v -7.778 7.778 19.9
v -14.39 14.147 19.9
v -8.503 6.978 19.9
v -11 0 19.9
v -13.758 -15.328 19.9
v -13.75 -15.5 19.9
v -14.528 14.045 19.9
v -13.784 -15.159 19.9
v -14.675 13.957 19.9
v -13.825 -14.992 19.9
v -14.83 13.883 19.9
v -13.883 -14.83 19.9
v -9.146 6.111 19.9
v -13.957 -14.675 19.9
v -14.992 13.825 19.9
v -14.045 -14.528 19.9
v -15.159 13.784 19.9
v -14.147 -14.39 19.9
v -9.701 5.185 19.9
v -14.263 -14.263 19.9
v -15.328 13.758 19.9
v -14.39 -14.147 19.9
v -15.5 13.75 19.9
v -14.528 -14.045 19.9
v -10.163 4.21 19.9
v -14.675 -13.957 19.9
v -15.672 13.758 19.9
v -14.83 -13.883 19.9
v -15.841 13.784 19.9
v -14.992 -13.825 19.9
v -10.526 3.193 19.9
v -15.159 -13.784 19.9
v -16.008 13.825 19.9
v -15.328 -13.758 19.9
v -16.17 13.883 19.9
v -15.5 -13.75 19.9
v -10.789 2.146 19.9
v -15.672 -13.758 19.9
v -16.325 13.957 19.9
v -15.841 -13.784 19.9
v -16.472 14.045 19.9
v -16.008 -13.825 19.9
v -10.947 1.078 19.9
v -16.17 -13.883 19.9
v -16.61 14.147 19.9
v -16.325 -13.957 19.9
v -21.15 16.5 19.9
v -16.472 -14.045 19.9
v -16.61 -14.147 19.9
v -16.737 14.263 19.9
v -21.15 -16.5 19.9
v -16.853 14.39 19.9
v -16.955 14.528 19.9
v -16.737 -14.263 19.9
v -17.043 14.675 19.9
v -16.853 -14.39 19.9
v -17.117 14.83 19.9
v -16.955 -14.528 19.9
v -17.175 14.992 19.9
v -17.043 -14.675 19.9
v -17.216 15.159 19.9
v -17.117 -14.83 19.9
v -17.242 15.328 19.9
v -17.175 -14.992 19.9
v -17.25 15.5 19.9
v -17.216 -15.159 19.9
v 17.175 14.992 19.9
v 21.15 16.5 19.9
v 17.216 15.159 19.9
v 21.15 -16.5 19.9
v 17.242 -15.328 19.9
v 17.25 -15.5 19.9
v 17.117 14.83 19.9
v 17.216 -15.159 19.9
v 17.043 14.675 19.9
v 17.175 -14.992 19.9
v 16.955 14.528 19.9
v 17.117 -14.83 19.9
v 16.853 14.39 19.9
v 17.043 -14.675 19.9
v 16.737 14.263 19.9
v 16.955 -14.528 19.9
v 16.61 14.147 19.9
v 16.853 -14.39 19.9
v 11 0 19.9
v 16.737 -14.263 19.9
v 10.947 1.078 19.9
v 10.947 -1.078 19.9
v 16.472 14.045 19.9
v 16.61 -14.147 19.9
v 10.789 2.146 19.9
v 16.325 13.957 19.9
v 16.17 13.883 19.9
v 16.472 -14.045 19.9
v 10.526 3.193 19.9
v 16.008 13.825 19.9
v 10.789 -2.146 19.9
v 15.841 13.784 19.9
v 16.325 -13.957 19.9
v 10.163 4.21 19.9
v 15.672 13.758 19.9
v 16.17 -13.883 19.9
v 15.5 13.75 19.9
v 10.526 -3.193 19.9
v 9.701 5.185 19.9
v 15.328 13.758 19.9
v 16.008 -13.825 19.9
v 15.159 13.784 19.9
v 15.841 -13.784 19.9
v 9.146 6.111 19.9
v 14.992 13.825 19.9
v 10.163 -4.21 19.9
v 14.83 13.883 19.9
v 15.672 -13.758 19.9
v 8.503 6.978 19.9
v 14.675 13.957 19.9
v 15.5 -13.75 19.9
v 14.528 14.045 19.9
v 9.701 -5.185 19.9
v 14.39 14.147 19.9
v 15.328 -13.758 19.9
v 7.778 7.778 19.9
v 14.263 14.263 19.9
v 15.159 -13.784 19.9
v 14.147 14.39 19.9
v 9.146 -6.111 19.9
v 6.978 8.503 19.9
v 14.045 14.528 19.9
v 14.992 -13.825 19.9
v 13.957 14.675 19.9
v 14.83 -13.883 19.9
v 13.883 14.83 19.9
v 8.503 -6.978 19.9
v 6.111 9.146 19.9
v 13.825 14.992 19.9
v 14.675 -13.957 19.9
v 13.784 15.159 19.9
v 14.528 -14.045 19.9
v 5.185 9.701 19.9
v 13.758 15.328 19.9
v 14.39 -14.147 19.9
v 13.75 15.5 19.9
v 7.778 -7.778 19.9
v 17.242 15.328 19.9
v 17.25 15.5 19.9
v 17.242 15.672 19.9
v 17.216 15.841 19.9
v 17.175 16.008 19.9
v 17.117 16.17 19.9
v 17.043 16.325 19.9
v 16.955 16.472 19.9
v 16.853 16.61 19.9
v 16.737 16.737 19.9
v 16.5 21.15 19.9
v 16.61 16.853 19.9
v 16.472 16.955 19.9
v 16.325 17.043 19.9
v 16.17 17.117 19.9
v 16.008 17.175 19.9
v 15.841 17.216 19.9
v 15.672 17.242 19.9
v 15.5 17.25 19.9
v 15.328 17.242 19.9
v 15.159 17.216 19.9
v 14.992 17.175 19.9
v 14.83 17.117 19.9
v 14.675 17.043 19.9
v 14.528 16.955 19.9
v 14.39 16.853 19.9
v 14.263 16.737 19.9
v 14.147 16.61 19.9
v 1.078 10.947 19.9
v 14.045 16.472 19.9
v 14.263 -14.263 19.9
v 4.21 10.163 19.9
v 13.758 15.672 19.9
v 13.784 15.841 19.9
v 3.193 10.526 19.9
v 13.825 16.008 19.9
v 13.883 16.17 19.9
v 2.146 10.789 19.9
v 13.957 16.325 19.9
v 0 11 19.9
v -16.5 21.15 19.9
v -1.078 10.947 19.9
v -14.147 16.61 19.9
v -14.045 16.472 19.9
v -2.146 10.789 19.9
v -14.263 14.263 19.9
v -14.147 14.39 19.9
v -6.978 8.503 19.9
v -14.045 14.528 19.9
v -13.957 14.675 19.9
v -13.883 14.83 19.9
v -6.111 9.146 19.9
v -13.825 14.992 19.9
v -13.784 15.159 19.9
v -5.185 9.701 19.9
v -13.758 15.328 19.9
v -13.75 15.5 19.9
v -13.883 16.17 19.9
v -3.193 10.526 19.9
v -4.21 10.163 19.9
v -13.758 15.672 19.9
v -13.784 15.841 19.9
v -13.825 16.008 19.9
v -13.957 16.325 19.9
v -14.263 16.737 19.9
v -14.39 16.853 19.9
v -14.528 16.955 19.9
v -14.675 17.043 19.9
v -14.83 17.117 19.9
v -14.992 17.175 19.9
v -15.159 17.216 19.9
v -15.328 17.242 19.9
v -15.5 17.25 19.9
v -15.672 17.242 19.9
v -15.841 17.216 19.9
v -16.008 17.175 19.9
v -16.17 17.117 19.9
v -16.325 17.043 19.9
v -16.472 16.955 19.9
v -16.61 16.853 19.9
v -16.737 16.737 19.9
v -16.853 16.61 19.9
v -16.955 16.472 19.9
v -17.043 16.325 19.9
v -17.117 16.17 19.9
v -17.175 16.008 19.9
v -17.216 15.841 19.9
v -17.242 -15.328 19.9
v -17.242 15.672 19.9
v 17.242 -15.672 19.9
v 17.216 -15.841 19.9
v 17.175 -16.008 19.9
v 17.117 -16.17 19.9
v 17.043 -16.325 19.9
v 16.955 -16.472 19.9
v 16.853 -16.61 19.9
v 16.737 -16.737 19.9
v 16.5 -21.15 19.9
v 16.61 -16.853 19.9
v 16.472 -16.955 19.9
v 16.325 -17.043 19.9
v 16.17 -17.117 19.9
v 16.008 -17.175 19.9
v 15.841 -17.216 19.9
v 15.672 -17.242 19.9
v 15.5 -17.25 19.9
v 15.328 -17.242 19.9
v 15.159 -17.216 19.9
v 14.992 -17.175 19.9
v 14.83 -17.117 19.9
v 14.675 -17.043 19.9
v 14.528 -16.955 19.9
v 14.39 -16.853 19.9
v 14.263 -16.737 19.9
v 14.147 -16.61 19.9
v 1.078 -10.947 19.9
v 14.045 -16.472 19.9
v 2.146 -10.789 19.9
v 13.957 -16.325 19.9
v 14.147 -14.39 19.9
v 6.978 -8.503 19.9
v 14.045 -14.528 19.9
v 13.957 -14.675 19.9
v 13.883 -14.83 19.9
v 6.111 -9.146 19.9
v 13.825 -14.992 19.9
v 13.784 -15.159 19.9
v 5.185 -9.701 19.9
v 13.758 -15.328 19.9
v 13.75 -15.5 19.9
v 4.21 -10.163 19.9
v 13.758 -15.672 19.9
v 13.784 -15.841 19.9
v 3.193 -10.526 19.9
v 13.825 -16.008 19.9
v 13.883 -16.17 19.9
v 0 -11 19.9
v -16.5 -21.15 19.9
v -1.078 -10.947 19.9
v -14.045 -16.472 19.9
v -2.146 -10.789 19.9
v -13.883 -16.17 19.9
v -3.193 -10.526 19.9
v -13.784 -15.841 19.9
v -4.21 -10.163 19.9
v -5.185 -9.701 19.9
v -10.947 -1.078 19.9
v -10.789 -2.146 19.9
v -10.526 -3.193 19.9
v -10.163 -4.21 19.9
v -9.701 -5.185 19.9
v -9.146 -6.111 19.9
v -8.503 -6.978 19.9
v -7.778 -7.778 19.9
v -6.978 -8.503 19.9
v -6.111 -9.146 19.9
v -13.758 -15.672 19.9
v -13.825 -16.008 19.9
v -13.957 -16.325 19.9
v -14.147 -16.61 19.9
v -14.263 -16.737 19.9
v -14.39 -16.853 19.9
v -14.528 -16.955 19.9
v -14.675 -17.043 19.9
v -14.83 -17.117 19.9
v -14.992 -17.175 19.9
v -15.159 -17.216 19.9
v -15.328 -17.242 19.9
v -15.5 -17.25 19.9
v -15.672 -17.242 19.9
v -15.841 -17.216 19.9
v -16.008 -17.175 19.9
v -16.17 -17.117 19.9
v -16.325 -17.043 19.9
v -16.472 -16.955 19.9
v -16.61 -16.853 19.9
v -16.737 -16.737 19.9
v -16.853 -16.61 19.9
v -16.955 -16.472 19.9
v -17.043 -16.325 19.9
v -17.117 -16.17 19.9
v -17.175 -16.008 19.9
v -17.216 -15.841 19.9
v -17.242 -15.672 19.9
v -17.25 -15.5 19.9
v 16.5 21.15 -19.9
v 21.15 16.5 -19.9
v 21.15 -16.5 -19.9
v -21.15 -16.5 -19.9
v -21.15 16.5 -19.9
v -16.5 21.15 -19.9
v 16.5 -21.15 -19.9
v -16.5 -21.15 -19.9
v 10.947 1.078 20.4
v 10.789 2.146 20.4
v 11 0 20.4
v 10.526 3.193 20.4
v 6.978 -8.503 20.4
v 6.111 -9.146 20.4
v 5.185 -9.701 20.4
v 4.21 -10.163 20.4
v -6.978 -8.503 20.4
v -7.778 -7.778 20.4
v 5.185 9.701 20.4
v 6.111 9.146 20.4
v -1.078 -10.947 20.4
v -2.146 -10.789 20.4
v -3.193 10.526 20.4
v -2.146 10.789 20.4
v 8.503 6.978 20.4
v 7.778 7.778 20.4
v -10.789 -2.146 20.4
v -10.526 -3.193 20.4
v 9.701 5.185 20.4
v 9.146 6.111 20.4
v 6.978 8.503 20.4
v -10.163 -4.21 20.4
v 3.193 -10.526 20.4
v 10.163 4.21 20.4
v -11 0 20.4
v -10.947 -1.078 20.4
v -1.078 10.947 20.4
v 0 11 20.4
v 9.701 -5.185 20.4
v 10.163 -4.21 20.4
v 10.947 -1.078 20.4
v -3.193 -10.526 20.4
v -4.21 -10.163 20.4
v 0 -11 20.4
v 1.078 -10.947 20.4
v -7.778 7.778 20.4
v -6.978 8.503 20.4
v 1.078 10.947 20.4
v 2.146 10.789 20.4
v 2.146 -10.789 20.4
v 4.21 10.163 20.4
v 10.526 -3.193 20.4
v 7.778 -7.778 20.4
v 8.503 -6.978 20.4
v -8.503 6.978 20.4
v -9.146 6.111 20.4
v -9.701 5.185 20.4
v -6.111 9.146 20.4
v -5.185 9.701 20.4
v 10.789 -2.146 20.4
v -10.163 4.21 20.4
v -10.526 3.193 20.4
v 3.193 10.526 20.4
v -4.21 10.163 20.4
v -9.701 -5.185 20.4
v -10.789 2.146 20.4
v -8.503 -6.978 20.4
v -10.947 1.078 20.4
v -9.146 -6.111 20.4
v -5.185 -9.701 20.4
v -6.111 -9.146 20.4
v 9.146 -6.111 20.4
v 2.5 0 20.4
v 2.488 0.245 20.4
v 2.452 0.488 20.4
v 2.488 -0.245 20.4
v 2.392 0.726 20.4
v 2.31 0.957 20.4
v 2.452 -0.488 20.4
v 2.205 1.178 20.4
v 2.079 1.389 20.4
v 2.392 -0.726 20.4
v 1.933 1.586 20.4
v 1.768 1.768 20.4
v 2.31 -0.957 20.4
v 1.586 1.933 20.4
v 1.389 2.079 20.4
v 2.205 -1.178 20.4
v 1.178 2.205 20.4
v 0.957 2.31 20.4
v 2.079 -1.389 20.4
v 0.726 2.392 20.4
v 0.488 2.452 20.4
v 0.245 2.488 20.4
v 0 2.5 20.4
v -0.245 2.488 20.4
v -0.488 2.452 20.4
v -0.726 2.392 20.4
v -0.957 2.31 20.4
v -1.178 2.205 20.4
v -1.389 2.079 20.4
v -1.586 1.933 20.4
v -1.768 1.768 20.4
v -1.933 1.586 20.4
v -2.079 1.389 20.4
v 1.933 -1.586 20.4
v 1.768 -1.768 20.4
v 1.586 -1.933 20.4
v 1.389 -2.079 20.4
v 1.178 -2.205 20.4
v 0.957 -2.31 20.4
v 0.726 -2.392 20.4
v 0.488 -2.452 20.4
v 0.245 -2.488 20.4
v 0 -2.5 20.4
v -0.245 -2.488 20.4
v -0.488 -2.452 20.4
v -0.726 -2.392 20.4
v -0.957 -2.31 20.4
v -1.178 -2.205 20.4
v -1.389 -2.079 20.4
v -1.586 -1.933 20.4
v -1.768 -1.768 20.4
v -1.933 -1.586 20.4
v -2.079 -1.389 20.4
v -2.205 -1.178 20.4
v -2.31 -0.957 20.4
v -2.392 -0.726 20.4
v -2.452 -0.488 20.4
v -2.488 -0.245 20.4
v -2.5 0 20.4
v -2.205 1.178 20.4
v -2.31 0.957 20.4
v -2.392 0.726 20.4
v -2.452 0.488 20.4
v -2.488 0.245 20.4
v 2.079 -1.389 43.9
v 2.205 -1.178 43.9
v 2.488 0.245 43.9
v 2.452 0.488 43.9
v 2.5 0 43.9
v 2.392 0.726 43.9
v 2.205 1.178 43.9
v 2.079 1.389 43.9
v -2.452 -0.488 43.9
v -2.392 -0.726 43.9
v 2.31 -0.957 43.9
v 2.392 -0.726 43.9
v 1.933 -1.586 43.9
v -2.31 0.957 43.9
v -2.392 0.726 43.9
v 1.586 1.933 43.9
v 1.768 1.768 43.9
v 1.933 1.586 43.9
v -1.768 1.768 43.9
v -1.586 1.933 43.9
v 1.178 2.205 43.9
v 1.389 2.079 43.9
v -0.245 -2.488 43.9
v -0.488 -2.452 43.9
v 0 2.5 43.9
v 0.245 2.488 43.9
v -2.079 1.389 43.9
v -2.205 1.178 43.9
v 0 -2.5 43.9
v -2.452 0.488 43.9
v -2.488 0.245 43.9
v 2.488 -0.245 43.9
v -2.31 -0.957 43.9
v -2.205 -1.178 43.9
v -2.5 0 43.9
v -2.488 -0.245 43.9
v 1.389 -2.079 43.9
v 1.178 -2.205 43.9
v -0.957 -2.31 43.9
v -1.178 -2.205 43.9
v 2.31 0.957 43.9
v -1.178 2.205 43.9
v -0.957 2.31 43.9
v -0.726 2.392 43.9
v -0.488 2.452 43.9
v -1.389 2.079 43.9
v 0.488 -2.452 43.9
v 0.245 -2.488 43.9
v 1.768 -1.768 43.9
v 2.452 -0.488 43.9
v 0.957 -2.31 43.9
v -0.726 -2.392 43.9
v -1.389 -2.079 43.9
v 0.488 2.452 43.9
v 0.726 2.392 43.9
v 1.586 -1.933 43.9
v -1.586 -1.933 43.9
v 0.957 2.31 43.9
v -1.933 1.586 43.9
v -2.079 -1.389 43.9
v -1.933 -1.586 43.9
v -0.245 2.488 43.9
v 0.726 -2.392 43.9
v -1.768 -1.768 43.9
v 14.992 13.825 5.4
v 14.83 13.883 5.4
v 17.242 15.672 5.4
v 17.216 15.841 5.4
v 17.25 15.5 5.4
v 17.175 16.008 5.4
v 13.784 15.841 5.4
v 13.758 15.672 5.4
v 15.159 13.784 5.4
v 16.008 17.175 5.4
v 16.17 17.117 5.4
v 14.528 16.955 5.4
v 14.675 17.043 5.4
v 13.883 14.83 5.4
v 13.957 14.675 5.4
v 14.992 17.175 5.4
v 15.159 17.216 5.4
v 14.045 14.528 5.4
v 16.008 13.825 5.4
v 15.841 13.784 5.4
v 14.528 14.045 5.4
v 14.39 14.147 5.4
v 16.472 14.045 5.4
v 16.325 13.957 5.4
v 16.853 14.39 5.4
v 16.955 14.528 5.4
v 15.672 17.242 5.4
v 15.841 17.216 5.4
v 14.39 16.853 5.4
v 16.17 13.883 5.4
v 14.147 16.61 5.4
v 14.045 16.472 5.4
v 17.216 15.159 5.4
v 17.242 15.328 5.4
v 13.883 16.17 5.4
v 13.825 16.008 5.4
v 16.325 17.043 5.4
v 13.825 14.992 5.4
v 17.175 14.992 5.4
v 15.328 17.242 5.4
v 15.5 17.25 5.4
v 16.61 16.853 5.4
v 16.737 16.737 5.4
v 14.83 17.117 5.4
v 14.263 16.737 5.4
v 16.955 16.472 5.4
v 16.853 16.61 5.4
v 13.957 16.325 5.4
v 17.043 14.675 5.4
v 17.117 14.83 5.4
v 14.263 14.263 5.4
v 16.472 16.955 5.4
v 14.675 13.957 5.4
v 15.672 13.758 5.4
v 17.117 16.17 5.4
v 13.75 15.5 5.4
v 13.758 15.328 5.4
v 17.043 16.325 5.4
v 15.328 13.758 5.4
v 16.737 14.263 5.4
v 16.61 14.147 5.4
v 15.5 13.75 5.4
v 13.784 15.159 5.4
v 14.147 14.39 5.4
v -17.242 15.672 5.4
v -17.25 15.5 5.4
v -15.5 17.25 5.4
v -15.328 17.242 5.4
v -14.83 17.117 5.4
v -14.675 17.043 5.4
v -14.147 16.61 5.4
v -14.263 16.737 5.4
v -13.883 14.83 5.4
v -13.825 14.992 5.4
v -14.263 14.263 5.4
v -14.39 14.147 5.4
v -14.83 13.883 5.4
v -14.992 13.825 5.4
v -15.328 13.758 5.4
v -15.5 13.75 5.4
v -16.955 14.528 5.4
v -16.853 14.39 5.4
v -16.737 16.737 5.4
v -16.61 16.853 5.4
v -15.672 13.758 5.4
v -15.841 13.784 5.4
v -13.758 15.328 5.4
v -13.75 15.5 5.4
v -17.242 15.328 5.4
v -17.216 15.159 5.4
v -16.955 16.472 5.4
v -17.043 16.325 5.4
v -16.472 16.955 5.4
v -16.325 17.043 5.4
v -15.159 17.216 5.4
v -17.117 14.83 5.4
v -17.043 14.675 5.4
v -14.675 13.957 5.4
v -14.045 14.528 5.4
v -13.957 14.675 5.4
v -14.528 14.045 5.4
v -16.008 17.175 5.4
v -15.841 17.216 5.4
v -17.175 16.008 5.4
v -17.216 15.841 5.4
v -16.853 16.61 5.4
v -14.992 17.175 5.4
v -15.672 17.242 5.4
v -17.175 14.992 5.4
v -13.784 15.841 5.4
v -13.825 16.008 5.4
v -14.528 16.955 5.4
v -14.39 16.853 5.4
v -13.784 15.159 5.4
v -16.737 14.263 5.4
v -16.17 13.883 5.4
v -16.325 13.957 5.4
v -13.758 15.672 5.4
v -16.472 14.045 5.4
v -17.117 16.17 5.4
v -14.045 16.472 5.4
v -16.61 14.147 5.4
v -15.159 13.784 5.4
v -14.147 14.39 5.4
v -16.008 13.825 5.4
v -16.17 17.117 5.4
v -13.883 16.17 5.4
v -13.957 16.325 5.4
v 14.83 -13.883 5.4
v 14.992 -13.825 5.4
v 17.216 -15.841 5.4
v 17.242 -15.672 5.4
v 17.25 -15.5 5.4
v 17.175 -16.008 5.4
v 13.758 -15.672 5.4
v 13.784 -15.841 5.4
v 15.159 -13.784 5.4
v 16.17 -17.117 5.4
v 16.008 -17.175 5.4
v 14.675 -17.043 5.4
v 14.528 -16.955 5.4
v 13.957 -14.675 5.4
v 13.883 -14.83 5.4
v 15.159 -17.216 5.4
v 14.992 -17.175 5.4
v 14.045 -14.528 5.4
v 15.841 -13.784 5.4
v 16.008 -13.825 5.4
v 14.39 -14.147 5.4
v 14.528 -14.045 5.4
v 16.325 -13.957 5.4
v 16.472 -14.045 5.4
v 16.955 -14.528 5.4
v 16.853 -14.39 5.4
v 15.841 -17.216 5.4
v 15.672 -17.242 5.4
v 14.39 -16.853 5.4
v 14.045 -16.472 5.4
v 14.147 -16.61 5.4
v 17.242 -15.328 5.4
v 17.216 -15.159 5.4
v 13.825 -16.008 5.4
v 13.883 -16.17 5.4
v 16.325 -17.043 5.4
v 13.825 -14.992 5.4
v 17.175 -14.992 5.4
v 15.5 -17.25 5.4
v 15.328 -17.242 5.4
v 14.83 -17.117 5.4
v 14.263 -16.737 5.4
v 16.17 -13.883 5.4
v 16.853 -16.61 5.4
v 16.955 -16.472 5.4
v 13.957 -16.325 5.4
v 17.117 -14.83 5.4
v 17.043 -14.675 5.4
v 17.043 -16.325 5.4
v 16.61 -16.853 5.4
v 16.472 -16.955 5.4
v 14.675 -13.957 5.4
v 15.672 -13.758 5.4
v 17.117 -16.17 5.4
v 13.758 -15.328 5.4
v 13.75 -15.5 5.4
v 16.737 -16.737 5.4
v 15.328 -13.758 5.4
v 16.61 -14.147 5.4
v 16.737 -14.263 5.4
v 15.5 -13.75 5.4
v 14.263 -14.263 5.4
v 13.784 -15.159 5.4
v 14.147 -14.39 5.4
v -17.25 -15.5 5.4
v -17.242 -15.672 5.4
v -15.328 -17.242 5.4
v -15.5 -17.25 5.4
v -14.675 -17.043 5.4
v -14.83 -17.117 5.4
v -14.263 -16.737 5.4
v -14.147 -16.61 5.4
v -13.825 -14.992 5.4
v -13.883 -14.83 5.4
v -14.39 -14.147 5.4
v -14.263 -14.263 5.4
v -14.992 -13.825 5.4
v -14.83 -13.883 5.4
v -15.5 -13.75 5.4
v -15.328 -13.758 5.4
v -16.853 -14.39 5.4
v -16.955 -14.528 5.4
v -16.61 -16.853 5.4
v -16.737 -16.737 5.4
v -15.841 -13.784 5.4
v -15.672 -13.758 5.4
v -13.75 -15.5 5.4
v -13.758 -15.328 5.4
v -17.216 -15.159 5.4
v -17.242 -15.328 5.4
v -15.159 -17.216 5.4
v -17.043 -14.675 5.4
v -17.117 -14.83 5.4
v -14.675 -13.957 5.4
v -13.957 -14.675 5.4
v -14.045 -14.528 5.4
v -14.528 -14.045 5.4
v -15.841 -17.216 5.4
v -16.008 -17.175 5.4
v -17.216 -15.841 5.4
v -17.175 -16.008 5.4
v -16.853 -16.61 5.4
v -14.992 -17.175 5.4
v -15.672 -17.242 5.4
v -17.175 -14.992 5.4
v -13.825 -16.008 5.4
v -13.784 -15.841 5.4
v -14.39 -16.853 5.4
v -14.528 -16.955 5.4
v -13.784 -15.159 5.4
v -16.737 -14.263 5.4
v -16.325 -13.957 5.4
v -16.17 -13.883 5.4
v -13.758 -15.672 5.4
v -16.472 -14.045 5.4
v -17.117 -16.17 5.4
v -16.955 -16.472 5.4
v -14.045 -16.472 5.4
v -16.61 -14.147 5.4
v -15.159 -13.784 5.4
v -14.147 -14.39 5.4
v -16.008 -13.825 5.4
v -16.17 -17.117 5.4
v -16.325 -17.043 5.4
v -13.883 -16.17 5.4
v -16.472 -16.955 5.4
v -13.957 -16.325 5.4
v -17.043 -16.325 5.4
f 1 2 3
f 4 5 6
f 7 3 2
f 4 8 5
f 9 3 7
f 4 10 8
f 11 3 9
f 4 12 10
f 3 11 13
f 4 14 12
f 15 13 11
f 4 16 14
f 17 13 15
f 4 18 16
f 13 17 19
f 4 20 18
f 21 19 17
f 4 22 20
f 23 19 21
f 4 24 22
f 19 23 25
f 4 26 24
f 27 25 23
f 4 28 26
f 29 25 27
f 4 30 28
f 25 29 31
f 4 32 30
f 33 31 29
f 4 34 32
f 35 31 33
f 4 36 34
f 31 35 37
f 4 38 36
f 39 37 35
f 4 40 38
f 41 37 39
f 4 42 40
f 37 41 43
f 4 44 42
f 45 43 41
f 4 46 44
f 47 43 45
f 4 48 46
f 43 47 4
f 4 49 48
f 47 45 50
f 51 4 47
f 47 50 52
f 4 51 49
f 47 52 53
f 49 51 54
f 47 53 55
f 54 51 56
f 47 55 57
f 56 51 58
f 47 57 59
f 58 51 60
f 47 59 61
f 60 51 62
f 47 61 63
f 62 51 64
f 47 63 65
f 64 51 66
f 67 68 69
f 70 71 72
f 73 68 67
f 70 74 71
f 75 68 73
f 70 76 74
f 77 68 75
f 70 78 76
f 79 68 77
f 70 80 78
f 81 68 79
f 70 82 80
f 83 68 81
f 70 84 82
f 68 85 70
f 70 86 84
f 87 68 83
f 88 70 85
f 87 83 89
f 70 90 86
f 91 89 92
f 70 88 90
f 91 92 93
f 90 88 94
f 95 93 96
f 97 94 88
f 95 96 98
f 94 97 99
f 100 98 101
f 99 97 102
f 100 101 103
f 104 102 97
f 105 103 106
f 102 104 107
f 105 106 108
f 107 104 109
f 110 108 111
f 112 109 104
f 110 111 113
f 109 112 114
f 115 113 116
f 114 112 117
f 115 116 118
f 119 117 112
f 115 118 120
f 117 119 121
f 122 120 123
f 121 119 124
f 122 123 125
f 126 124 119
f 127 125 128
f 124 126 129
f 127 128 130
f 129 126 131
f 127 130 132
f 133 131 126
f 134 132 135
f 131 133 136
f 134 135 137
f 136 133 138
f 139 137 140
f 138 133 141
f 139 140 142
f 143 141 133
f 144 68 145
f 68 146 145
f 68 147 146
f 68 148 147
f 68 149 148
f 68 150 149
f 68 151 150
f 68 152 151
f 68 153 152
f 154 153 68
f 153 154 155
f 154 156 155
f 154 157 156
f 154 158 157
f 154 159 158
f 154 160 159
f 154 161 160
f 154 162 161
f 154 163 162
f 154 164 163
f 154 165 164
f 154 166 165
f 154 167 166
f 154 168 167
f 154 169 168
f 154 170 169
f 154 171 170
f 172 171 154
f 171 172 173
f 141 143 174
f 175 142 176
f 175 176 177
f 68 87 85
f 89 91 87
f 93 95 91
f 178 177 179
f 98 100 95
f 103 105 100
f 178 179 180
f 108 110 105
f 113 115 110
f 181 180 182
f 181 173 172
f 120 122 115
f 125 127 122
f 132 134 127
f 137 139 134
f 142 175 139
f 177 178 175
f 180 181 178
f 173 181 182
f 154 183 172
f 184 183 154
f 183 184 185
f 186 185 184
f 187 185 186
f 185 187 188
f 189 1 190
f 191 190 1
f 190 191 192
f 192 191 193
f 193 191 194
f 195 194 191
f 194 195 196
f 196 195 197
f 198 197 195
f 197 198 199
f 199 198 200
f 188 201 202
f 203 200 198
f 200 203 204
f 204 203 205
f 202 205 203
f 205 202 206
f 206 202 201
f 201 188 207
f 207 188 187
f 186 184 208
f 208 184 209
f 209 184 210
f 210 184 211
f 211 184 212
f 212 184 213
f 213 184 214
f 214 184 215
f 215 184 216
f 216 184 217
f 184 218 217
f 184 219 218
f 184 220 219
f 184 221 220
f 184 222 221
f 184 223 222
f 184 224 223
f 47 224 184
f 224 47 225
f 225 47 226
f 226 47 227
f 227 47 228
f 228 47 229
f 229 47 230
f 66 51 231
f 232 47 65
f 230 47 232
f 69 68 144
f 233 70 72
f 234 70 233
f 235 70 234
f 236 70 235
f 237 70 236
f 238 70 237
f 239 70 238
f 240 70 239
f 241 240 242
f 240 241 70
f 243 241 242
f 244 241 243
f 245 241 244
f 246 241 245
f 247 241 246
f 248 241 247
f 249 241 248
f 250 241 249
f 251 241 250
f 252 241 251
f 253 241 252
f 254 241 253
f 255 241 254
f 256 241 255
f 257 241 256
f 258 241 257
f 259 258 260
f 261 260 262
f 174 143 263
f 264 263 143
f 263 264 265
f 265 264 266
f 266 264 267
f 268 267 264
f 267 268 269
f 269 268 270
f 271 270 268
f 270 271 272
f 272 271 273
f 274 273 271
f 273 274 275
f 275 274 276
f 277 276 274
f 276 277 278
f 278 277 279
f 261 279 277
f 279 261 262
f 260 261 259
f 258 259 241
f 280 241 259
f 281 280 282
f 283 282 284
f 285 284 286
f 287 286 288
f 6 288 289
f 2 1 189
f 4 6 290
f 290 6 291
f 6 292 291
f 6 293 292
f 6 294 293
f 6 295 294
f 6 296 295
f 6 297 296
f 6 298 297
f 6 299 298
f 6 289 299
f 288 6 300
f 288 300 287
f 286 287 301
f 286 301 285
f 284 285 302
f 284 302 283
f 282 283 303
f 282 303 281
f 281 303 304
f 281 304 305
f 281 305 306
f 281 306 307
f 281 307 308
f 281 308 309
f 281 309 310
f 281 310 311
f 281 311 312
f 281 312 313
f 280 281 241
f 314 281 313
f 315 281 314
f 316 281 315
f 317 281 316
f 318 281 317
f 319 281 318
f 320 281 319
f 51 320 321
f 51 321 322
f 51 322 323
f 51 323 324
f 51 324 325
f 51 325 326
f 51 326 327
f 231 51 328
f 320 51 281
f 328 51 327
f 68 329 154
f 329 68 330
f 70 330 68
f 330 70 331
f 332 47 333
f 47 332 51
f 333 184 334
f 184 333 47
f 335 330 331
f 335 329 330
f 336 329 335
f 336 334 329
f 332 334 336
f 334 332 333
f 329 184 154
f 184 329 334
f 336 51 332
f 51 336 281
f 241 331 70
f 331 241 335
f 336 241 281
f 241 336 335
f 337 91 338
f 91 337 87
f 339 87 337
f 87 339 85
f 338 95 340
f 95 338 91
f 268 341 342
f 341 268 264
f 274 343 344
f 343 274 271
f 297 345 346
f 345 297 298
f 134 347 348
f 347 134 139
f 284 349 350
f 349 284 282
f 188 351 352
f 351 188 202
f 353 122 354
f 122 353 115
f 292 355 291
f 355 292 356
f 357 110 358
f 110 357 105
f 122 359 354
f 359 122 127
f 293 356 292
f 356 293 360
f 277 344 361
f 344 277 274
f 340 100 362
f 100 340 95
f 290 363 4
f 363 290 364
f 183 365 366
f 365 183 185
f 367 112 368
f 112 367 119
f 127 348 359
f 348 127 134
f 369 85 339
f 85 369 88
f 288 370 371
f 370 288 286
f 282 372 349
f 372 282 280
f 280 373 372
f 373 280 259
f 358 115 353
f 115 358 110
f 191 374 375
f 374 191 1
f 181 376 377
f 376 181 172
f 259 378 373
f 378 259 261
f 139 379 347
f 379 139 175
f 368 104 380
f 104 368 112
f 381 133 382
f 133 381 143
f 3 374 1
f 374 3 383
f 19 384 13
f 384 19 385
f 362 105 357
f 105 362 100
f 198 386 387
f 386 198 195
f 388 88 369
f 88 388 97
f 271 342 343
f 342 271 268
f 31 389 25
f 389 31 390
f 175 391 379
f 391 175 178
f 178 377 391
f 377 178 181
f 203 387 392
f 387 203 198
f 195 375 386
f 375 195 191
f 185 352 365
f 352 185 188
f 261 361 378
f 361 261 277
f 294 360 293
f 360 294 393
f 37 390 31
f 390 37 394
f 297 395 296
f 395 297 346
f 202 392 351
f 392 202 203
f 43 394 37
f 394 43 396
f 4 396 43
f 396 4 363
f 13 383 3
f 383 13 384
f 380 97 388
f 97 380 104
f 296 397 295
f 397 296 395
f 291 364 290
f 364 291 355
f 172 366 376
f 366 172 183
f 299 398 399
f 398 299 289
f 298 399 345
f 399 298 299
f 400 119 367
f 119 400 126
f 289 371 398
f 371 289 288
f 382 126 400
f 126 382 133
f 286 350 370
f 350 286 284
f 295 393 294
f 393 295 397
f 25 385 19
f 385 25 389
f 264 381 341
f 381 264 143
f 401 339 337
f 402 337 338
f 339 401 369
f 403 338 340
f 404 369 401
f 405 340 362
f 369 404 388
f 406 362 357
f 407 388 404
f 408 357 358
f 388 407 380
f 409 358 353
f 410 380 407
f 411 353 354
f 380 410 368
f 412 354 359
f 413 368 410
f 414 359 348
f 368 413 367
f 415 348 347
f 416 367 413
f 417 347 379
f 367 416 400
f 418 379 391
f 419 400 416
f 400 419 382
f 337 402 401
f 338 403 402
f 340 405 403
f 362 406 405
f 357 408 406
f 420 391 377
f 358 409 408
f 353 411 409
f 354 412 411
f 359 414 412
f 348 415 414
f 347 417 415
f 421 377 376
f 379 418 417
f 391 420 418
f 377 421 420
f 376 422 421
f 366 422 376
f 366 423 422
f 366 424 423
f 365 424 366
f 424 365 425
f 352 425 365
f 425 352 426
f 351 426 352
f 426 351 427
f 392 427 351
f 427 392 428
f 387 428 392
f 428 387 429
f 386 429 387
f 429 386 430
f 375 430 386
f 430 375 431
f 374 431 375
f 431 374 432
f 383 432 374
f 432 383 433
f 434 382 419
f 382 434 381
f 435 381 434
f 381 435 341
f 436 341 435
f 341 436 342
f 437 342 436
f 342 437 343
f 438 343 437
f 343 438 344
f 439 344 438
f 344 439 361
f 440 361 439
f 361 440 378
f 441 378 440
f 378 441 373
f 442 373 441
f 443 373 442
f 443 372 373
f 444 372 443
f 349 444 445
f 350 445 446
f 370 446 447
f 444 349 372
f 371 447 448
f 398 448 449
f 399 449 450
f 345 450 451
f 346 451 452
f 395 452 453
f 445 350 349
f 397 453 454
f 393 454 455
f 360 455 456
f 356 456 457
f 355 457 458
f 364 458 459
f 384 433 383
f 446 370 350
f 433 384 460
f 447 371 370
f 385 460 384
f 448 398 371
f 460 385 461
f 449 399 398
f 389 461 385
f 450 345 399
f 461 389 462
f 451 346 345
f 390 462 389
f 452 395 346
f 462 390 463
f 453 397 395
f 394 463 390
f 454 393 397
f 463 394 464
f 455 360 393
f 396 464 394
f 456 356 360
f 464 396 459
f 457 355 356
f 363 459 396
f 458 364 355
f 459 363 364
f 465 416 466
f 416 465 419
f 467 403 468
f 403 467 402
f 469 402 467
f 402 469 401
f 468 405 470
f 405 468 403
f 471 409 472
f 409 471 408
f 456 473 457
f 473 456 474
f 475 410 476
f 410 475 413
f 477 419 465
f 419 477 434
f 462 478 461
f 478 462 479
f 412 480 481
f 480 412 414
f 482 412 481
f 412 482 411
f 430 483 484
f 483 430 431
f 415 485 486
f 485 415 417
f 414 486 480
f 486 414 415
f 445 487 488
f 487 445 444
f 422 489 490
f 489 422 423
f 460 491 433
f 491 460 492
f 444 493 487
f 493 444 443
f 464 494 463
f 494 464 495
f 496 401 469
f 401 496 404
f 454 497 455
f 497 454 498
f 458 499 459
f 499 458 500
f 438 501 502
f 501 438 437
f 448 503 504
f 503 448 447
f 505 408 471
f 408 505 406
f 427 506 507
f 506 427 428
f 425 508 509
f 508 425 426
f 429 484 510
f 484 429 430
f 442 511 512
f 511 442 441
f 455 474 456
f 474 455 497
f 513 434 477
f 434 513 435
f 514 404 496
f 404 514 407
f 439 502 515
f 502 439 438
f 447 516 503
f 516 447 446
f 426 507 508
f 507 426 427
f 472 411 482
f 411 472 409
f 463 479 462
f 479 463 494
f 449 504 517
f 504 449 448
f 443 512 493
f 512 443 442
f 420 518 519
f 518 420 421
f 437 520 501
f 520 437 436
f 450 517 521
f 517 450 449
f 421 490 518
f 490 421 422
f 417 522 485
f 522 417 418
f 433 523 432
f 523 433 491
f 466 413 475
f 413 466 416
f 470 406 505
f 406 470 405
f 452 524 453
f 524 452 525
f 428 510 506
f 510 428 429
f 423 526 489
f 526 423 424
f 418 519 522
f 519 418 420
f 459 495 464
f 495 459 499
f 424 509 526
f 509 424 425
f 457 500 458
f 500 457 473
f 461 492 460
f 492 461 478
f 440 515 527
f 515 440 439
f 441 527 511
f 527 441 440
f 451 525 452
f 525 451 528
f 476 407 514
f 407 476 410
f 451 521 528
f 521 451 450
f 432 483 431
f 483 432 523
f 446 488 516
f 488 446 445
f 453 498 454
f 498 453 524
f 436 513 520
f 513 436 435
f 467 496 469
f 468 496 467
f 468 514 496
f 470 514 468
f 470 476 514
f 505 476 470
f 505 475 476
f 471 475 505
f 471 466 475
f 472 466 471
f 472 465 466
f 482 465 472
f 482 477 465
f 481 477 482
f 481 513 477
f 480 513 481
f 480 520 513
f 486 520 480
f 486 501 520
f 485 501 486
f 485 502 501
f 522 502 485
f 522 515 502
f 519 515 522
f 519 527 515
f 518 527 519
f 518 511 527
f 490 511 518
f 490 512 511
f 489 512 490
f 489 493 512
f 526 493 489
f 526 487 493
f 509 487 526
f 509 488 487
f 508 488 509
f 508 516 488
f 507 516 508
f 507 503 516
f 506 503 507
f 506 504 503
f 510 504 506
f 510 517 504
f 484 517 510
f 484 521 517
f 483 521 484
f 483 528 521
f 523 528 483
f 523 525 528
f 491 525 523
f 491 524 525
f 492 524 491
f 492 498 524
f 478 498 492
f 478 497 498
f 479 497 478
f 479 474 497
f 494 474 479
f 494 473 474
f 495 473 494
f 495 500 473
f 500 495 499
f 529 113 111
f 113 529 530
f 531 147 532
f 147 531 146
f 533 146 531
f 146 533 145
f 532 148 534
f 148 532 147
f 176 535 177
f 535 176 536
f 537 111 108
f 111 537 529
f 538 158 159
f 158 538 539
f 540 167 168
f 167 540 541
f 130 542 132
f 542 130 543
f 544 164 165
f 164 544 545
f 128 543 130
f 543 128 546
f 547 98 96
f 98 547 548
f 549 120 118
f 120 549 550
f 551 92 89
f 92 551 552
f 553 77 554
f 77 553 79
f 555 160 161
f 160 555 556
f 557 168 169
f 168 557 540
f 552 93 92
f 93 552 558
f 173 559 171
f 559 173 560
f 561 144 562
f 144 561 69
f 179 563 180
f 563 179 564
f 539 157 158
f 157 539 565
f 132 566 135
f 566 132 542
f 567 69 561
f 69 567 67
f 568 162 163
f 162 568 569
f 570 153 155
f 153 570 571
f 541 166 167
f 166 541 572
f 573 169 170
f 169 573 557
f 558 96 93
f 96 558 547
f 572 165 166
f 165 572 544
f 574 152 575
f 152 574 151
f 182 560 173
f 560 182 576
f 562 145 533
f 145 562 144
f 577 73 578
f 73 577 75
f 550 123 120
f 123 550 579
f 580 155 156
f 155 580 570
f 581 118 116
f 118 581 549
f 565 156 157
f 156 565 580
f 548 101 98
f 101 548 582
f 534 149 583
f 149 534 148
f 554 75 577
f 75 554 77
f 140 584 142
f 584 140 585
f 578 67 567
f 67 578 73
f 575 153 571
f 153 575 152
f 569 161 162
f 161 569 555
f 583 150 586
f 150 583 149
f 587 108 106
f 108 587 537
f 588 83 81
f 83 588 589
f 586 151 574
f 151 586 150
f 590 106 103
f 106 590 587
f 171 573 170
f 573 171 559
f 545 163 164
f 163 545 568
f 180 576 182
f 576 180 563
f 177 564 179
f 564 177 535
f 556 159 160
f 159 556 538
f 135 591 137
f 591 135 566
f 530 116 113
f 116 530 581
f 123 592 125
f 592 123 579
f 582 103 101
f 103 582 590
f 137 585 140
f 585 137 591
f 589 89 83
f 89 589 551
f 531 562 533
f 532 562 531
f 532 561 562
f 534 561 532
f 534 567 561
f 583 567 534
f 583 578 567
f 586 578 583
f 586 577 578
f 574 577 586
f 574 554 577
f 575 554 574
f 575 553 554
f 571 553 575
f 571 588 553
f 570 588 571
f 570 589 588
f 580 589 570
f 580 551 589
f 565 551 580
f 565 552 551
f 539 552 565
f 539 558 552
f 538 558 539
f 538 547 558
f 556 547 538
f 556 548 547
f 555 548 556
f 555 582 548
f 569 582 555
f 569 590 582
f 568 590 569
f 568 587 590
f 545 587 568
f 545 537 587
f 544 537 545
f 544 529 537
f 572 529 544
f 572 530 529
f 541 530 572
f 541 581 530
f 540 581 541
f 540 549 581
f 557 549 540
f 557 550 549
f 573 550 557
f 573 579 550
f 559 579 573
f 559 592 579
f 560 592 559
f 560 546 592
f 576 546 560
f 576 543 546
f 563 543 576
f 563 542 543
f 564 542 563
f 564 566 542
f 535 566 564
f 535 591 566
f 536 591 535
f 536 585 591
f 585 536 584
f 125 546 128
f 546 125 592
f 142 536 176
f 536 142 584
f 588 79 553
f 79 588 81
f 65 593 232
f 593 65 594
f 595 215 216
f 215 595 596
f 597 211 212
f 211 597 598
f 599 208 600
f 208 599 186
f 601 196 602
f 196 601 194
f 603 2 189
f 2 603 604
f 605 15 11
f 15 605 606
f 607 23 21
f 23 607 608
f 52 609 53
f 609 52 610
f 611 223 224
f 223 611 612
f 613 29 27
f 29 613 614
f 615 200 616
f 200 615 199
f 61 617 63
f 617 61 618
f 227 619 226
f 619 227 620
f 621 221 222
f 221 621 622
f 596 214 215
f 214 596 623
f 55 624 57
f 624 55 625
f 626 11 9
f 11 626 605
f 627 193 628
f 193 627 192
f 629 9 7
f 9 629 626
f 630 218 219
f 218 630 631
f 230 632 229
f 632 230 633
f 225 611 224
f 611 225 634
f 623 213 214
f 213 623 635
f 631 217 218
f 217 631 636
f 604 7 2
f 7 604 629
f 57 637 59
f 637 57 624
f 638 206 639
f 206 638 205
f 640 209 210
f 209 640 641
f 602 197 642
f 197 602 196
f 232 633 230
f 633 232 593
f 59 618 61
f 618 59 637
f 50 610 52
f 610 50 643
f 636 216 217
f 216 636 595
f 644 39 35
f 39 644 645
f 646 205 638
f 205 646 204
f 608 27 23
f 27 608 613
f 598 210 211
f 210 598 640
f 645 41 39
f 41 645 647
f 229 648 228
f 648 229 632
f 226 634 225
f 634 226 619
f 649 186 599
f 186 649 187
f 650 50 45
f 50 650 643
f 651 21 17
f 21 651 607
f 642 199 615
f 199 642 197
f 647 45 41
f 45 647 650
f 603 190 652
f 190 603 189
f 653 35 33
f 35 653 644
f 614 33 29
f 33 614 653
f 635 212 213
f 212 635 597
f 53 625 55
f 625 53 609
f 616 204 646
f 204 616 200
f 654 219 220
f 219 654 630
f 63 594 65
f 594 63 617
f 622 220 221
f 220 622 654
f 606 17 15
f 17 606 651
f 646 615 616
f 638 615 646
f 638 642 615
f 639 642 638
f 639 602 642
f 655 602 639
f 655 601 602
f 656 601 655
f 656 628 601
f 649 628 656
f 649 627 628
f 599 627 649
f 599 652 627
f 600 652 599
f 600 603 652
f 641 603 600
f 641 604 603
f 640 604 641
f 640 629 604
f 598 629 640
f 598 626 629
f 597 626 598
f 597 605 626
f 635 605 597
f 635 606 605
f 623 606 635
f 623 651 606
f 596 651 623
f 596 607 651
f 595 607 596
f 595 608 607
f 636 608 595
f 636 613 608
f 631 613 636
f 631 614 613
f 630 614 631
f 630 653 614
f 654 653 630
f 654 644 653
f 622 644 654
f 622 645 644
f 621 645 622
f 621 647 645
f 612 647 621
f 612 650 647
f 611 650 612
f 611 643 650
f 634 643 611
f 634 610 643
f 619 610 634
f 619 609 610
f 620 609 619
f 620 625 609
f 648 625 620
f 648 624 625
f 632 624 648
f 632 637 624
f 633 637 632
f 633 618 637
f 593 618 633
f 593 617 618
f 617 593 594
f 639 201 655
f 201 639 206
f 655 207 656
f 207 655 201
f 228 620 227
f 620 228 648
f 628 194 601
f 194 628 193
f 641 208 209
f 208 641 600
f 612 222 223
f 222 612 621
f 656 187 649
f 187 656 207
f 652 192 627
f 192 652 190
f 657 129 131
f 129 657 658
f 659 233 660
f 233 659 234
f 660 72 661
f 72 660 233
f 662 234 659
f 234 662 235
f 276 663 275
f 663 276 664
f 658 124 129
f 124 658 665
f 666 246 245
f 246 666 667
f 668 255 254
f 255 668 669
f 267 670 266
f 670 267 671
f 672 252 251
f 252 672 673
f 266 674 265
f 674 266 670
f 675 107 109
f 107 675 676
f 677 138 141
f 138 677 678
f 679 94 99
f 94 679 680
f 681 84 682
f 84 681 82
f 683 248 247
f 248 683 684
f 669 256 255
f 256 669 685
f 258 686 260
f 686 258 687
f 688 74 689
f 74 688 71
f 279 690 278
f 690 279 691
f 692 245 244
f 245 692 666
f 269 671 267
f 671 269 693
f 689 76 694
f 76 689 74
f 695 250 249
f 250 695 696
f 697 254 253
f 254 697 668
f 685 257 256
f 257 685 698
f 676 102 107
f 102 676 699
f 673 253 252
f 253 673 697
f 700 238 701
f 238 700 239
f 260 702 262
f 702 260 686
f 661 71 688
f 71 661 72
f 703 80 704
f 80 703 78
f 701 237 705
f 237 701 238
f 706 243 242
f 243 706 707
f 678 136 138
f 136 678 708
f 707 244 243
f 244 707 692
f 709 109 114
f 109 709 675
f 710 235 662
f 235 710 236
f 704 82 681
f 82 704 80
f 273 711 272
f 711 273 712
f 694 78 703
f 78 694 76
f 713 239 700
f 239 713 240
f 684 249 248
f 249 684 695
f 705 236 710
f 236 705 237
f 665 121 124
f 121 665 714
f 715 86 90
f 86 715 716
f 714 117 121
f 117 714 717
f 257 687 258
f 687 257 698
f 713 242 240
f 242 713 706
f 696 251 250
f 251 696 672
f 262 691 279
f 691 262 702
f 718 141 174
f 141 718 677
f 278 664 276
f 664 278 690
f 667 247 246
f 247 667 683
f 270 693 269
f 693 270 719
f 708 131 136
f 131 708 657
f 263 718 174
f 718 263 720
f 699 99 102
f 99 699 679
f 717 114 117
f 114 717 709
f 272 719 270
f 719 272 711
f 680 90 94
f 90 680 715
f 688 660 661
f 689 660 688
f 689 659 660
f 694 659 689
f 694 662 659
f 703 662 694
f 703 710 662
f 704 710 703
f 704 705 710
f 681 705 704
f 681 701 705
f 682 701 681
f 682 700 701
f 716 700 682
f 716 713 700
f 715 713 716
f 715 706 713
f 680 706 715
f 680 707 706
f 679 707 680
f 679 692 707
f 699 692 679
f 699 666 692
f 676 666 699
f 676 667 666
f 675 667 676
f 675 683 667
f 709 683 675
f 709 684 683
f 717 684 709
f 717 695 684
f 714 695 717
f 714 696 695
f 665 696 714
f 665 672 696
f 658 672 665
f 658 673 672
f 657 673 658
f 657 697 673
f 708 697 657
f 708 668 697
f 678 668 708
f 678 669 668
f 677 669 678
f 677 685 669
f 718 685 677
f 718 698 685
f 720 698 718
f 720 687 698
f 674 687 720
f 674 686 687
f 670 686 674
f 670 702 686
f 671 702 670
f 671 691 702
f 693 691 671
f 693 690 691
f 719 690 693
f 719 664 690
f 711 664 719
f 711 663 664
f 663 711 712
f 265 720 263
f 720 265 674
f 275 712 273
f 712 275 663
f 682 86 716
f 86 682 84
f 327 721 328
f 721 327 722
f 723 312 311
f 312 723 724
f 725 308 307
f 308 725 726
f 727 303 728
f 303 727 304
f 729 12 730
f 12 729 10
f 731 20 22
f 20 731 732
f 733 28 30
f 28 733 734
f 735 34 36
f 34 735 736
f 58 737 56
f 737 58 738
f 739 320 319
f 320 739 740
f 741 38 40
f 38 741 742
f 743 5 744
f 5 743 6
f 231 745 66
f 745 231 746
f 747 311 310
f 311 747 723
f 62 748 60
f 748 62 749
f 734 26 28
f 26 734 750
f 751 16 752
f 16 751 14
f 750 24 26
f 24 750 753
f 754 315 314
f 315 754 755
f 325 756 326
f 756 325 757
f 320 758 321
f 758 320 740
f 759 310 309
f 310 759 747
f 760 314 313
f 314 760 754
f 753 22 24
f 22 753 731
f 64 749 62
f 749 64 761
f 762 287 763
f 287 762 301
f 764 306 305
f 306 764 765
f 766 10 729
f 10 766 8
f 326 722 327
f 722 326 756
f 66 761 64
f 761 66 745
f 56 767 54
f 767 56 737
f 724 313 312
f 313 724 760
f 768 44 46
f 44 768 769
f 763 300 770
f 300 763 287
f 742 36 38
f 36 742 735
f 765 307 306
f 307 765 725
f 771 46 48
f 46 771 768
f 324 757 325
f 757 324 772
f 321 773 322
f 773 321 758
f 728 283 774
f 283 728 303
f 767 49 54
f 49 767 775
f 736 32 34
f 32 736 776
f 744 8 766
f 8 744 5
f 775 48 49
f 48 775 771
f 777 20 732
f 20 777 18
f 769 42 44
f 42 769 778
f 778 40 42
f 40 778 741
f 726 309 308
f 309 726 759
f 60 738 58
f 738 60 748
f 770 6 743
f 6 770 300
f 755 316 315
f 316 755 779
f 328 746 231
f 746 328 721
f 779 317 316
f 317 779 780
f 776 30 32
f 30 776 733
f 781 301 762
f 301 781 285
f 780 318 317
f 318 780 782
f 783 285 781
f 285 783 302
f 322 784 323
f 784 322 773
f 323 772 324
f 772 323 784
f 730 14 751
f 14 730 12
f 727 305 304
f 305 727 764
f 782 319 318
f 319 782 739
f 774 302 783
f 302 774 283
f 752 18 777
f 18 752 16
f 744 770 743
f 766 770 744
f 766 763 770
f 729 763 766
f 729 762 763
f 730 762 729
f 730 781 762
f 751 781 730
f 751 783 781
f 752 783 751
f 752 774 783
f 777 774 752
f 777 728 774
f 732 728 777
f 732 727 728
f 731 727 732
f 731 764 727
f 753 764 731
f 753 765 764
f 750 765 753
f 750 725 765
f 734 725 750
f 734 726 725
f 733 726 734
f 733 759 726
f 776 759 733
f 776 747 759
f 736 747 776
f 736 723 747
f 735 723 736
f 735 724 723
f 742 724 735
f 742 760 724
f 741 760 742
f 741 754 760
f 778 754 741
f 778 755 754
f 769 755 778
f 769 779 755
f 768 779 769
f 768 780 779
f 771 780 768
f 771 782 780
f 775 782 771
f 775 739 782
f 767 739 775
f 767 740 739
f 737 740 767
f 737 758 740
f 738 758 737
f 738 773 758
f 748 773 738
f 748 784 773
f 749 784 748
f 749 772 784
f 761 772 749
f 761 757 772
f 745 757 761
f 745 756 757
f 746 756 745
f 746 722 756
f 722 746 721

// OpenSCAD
///VARIABLES

//Overall width.
cube_x = 42.3; //[10:0.1:100]
//Width to the chamfer - if none, just keep it the same as the x value.
cube_y = 33; //[10:0.1:100]
//Depth OR Length of the motor
cube_z = 39.8; //[10:0.1:100]

//The large slightly protruding inner cylinder that surrounds the shaft
cyl_dia = 22; //[10:0.1:100]
//Amount by which the inner cylinder protrudes above the flat top of the motor
cyl_extra_height = 2;

//Shaft diameter
shaft_dia = 5;
//Shaft length above the top of the main flat of the motor -- NOT the protruding cylinder
shaft_length = 24;

//The diameter of the threaded inserts
retain_dia = 3.5;
//Overall seperation of the centers of the threaded retaining holes 
retain_placement = 31; 
//How deep the holes extend into the body, set to zero to remove
retain_depth = 15;


//Variables - Inner
retain_spacing = retain_placement/2;
cyl_resolution = 64*1;






///RENDERS
difference(){
union(){
hull(){
wide_cube();
tall_cube();
}

large_cylinder();
shaft();
}

retain_all();
}

///MODULES
module retain_all(){
    translate([0,0,(cube_z/2) - (retain_depth/2) + 1]){   
    retain_double();
    mirror([0,1,0]){
           retain_double();
        }
    }
}

module retain_double(){
    retain_single();
    mirror([1,0,0]){
        retain_single();
    }
}

module retain_single(){
    translate([retain_spacing,retain_spacing,0]){
        cylinder(h = retain_depth + 1, d = retain_dia, center = true, $fn = cyl_resolution); 
    }
}


module wide_cube(){
    
    cube([cube_x,cube_y,cube_z], center = true);
    
}

module tall_cube(){
       
    rotate([0,0,90]){
        wide_cube();
    }
    
}

module large_cylinder(){
    translate([0,0,(cube_z/2) - 1]){
        cylinder(h = cyl_extra_height + 1, d = cyl_dia, center = true, $fn = cyl_resolution); 
    }
}

module shaft(){
    translate([0,0,(cube_z/2) + (shaft_length/2)]){
        cylinder(h = shaft_length, d = shaft_dia, center = true, $fn = cyl_resolution); 
    }
    
}
